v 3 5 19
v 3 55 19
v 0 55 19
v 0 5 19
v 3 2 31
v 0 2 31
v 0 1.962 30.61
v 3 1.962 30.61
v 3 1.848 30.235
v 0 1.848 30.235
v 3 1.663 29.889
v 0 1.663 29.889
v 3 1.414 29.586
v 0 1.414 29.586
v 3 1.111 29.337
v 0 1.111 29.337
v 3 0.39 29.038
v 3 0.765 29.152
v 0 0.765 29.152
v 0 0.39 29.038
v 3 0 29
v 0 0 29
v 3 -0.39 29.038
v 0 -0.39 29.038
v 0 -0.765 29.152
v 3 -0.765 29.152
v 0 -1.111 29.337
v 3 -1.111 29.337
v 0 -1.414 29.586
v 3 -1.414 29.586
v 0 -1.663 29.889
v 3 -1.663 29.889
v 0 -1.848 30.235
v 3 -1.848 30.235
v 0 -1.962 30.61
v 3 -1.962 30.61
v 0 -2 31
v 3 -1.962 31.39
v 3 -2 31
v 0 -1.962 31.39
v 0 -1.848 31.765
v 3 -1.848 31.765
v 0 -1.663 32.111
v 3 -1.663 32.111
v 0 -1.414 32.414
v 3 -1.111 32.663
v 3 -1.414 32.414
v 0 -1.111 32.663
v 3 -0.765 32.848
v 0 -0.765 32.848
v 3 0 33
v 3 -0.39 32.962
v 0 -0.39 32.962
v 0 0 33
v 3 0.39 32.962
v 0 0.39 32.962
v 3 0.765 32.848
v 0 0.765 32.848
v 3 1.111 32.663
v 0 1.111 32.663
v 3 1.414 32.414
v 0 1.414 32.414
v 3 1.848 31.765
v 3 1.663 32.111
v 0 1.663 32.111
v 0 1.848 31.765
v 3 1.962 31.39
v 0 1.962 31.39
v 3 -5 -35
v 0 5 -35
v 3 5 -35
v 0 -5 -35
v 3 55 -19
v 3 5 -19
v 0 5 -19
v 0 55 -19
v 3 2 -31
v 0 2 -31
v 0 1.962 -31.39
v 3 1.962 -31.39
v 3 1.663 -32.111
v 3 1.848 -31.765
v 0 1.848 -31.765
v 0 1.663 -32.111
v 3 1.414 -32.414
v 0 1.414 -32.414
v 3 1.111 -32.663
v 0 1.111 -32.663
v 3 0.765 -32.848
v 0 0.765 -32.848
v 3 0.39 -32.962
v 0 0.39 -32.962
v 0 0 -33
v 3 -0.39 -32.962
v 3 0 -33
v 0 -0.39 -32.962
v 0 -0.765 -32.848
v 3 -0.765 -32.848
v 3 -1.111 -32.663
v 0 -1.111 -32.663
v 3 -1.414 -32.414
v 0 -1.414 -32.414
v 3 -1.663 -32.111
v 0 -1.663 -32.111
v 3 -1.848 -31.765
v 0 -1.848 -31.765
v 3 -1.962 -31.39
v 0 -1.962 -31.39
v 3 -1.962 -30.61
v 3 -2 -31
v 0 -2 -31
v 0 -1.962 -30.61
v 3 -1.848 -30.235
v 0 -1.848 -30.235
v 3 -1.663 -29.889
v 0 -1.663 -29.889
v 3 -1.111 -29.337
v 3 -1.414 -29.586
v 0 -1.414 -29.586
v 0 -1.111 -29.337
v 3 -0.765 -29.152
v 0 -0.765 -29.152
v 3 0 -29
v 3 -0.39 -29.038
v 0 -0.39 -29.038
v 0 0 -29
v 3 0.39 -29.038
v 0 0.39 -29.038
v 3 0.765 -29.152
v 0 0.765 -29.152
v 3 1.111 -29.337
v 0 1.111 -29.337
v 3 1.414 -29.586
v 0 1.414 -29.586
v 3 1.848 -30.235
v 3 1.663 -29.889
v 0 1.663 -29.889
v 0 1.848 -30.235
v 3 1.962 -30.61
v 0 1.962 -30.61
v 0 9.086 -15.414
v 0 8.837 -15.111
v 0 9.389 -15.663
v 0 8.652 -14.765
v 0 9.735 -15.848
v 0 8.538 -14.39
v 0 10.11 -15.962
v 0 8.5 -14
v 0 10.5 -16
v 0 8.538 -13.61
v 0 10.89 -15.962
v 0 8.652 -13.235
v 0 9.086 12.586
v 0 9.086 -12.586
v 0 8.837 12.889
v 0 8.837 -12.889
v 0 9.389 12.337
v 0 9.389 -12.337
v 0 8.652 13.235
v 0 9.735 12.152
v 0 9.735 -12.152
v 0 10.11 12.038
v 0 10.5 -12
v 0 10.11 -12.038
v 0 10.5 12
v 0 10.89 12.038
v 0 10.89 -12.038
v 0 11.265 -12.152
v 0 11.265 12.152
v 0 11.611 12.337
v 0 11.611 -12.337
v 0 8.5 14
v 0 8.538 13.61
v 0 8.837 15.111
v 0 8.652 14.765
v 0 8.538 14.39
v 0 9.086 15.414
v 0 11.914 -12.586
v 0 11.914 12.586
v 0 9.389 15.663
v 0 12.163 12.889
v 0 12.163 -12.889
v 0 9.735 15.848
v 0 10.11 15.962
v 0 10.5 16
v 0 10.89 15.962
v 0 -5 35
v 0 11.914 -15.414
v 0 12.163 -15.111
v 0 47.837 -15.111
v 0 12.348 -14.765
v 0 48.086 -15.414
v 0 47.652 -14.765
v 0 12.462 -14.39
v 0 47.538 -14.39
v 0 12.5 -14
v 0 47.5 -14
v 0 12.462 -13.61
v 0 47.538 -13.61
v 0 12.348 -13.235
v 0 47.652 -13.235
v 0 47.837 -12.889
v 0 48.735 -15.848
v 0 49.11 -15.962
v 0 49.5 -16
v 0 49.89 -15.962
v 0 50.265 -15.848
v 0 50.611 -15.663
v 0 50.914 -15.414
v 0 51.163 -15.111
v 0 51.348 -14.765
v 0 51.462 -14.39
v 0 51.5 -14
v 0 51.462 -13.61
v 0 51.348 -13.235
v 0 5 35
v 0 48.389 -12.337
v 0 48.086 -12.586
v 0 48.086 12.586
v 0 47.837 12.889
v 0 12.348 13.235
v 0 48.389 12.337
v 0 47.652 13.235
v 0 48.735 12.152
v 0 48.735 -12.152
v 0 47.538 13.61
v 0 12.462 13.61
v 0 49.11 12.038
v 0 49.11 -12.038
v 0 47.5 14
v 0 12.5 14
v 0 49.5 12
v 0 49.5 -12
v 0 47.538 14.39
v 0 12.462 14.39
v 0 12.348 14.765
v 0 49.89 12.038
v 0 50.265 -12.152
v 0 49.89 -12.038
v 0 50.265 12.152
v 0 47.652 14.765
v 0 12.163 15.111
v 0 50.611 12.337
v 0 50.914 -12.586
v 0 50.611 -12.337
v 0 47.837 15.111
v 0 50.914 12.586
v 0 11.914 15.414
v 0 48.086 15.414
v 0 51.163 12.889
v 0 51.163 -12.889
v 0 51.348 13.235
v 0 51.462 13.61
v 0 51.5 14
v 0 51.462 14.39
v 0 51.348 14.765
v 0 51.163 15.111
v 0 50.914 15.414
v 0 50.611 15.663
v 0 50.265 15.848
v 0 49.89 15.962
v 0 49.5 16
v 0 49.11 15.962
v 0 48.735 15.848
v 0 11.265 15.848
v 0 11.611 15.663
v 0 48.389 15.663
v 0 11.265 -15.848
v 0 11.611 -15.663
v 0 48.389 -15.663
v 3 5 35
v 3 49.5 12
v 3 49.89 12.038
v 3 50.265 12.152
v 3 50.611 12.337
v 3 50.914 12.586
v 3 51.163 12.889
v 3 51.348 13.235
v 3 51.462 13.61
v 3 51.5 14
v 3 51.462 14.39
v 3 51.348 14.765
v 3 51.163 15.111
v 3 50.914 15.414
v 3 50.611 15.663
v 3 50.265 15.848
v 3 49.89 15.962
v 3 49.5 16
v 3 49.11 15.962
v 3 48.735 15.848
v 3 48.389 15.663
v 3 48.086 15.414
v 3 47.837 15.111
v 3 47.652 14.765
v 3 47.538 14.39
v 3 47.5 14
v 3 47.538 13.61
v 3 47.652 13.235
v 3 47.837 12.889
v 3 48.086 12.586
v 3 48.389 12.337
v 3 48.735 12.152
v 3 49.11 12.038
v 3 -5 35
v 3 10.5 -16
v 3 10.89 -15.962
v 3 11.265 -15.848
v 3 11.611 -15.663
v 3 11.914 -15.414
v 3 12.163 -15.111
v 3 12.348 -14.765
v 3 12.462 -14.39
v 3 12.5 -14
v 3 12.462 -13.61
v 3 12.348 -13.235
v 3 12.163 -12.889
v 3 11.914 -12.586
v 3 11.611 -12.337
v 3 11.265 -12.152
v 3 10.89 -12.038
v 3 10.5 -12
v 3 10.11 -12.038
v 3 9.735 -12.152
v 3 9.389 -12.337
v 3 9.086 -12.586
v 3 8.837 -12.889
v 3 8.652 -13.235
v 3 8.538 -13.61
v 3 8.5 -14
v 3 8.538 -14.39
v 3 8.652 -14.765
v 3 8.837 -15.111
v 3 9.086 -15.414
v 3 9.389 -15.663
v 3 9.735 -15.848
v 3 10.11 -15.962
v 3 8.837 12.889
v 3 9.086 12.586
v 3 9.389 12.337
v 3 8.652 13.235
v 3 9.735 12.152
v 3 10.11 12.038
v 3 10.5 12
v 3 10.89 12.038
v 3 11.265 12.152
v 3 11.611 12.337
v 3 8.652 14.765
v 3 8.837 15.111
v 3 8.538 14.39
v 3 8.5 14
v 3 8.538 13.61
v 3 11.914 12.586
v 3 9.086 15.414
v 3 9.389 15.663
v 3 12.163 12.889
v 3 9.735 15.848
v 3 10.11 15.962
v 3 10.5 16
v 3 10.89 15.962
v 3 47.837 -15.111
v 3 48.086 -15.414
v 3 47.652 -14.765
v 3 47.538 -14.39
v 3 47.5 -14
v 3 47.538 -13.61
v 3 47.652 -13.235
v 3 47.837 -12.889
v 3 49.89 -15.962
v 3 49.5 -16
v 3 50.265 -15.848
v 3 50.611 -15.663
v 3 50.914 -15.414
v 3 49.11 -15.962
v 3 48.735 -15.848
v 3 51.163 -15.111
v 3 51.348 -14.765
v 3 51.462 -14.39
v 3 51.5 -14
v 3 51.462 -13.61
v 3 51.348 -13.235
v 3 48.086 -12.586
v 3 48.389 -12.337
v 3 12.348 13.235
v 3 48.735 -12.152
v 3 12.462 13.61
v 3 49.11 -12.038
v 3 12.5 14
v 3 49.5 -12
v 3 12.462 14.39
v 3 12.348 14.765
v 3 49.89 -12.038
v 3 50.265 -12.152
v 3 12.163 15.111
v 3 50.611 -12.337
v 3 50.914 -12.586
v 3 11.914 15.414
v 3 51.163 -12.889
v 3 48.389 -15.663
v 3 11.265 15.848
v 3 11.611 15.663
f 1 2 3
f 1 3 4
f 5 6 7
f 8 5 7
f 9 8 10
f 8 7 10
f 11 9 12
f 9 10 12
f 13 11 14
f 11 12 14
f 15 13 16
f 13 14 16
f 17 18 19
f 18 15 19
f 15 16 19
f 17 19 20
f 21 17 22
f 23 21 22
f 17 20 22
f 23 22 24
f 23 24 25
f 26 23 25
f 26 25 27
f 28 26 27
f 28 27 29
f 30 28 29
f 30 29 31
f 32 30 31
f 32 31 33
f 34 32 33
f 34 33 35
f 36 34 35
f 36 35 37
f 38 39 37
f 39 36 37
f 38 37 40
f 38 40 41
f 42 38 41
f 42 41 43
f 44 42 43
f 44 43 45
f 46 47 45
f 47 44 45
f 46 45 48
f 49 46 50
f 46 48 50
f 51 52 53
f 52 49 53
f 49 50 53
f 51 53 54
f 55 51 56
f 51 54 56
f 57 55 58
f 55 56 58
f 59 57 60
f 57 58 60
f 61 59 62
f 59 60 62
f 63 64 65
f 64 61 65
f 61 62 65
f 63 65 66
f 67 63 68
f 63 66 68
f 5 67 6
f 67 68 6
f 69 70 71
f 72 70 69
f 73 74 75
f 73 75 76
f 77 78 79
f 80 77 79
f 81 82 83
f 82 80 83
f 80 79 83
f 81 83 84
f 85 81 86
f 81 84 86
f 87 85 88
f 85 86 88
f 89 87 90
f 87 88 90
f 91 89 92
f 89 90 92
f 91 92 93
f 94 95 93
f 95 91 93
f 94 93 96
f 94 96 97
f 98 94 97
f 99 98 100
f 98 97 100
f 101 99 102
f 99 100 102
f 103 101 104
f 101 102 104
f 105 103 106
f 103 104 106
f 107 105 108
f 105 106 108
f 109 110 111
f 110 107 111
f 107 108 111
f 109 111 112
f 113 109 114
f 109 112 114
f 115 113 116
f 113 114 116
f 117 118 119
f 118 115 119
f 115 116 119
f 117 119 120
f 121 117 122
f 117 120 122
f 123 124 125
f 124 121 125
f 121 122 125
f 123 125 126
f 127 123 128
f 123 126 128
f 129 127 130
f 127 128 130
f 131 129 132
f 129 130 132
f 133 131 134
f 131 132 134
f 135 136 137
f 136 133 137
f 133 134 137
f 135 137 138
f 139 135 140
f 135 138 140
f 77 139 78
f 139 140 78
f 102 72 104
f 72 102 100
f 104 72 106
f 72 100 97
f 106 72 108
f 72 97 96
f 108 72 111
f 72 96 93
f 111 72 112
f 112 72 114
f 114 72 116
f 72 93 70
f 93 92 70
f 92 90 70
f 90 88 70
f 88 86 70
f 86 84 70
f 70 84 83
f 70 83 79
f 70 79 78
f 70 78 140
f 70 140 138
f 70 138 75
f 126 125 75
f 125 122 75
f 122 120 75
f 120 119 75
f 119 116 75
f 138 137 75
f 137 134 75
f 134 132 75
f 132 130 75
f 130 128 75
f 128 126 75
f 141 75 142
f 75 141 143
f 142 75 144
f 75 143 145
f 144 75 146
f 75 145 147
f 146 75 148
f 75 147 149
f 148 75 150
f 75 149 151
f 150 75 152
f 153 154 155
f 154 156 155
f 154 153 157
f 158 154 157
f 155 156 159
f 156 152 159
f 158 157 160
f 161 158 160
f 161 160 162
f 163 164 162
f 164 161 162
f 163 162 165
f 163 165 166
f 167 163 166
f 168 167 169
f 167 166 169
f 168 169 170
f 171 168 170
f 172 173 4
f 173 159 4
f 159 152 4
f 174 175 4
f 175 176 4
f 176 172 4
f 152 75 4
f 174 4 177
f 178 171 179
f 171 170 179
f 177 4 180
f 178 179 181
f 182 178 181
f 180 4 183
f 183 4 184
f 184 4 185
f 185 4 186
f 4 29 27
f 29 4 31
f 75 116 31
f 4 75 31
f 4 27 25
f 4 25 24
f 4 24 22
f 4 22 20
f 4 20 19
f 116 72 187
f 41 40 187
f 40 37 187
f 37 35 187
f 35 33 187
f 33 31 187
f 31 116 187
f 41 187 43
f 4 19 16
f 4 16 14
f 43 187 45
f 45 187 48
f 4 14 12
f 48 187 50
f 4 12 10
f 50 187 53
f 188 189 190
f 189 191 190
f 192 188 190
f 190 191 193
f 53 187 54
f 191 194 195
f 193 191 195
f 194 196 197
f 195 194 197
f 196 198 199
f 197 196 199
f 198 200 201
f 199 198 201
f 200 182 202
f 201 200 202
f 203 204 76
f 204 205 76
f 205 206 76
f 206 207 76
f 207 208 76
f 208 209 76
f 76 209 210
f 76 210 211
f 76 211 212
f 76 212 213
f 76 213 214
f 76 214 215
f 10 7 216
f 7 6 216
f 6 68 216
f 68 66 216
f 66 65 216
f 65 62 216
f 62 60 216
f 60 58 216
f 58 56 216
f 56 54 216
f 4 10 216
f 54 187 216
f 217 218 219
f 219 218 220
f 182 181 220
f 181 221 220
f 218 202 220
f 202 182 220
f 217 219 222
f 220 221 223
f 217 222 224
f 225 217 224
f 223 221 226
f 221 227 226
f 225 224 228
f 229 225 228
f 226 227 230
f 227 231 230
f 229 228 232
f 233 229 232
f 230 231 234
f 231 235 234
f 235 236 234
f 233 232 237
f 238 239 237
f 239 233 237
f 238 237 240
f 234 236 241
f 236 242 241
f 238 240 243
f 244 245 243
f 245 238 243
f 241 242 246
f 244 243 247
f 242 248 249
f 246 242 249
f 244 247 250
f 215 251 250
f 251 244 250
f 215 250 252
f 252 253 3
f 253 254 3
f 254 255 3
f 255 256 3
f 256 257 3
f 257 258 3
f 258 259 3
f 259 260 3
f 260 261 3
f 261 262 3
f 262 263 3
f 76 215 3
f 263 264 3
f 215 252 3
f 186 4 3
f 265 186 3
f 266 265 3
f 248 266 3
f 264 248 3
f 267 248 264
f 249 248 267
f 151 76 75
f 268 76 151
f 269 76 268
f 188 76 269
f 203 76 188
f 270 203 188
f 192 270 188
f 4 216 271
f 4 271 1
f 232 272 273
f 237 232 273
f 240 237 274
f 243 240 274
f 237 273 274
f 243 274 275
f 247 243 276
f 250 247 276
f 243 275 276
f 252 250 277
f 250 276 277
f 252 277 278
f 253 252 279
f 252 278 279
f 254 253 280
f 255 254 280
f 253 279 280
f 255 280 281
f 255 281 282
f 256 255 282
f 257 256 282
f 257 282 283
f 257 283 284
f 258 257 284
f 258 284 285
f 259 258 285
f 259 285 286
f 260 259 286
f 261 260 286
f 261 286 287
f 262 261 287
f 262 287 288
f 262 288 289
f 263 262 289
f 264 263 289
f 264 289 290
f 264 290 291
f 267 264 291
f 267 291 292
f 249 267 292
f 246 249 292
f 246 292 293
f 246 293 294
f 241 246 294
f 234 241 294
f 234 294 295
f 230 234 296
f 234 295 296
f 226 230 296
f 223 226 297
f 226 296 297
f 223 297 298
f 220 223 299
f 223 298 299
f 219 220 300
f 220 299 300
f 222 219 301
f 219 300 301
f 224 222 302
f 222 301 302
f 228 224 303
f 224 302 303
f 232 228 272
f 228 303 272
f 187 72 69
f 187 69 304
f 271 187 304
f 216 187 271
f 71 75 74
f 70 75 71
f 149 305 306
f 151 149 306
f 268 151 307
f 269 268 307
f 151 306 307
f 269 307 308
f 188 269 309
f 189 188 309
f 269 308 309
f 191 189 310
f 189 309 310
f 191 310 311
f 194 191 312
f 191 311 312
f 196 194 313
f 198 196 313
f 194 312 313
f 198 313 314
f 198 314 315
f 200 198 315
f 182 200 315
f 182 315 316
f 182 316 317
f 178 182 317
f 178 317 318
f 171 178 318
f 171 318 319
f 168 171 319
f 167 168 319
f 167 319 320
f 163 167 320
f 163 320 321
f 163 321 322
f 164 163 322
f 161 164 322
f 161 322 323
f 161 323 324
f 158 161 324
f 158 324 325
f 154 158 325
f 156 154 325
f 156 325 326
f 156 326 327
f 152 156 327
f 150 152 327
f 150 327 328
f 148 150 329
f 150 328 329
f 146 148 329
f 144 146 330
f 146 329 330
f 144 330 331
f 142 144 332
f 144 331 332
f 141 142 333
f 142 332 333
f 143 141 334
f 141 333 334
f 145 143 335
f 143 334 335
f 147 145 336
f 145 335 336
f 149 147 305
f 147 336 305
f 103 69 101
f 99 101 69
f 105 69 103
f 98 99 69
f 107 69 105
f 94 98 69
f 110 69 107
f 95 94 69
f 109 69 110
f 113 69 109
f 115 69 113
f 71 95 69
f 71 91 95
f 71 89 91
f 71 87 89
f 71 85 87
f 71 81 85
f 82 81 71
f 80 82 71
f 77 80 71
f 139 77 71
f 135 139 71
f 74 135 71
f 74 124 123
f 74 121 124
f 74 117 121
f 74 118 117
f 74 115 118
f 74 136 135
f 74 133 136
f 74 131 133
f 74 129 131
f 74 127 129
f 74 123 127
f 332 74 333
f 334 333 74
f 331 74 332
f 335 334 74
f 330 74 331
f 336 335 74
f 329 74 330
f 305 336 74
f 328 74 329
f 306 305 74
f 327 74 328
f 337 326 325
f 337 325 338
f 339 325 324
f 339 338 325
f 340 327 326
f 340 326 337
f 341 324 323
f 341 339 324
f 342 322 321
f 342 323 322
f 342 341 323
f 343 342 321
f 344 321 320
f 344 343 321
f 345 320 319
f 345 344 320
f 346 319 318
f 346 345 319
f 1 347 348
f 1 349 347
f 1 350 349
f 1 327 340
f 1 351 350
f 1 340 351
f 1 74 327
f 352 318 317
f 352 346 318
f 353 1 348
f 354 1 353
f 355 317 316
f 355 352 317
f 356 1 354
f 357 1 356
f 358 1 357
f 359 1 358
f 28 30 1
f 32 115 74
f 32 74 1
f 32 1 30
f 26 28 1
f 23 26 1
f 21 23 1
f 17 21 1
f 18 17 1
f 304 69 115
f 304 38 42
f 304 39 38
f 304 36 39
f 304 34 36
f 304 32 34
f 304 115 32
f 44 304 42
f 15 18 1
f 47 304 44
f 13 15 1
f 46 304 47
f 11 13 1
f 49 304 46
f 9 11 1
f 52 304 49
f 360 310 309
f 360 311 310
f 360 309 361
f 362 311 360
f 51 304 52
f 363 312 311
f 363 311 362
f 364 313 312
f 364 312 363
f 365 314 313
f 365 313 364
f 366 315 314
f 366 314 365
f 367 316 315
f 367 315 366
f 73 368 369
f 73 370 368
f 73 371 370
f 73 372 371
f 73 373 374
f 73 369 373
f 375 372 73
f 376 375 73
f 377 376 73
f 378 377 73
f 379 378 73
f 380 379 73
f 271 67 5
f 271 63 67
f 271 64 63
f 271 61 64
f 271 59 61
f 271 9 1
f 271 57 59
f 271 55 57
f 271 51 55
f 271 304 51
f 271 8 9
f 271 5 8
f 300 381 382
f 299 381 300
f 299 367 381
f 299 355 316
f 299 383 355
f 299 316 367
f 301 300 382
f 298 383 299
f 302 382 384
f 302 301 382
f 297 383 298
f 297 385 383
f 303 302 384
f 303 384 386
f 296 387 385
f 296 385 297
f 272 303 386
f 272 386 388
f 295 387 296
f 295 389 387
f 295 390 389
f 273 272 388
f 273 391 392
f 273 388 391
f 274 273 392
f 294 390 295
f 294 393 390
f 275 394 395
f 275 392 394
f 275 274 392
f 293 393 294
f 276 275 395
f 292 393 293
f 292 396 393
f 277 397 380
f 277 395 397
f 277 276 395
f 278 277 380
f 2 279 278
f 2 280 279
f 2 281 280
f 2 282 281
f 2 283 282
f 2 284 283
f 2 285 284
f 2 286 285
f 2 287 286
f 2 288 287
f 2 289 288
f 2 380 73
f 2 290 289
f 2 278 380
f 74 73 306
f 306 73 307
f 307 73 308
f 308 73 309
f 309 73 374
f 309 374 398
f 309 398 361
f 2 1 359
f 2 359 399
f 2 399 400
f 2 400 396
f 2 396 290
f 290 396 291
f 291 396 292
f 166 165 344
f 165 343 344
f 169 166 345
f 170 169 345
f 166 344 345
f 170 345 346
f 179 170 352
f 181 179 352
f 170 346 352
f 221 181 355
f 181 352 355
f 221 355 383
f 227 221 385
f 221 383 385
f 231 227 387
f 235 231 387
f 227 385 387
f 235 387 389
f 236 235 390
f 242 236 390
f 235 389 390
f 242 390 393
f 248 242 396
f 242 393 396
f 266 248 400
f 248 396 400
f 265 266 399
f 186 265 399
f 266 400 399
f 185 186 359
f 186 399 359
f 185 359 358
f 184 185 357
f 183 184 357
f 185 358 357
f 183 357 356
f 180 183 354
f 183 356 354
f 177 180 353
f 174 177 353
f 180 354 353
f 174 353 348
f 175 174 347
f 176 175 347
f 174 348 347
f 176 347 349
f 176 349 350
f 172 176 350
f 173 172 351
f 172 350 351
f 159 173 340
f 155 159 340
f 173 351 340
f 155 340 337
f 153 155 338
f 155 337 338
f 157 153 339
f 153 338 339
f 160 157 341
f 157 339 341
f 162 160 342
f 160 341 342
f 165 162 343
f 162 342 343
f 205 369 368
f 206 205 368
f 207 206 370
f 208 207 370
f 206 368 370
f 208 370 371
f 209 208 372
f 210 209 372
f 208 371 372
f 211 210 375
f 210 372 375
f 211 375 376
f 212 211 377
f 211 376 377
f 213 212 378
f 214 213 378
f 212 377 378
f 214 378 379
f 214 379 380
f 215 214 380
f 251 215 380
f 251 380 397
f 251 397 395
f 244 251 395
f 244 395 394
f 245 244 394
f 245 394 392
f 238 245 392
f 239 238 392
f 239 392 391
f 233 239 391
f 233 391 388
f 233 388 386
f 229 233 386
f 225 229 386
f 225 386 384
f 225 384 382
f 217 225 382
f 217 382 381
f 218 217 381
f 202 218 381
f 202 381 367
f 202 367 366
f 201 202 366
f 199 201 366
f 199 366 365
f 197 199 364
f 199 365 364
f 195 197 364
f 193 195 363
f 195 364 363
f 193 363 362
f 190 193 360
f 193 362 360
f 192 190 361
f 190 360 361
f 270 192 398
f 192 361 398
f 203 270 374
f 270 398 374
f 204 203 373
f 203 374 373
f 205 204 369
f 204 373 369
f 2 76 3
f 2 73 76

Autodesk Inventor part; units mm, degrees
ref_plane "YZ Plane" through (0, 0, 0) normal (1, 0, 0) x (0, 1, 0)
ref_plane "XZ Plane" through (0, 0, 0) normal (0, 1, 0) x (-1, 0, 0)
ref_plane "XY Plane" through (0, 0, 0) normal (0, 0, 1) x (1, 0, 0)
sketch "Эскиз1" plane through (0, 0, 0) normal (1, 0, 0) x (0, 1, 0)
  line L0 (0, 0) -> (0, 31)
  line L1 (0, 0) -> (0, -31)
  circle A0 centre (0, 31) radius 2
  circle A1 centre (0, -31) radius 2
  line L2 (-5, 35) -> (5, 35)
  line L3 (5, 35) -> (5, -35)
  line L4 (5, -35) -> (-5, -35)
  line L5 (-5, -35) -> (-5, 35)
  line L6 (-5, 35) -> (5, -35) construction
  line L7 (5, 35) -> (-5, -35) construction
  dimension "d0" = 31
  dimension "d1" = 31
  dimension "d2" = 4
  dimension "d3" = 4
  dimension "d4" = 10
  dimension "d5" = 70
extrude "Выдавливание1" add sketch "Эскиз1" along normal blind 3
sketch "Эскиз2" plane through (3, 0, 0) normal (1, 0, 0) x (0, 0, -1)
  line L0 (35, 5) -> (-35, 5) projected
  line L1 (0, 5) -> (-14, 5)
  line L2 (-14, 5) -> (14, 5)
  line L3 (-14, 5) -> (-14, 10.5)
  line L4 (-14, 5) -> (-19, 5)
  line L5 (-19, 5) -> (19, 5)
  line L6 (19, 5) -> (19, 55)
  line L7 (19, 55) -> (-19, 55)
  line L8 (-19, 55) -> (-19, 5)
  circle A0 centre (-14, 10.5) radius 2
  line L9 (19, 30) -> (-19, 30)
  line L10 (0, 30) -> (0, 26.3042)
  circle A1 centre (14, 10.5) radius 2
  circle A2 centre (-14, 49.5) radius 2
  circle A3 centre (14, 49.5) radius 2
  point P0 (0, 0)
  dimension "d8" = 14
  dimension "d9" = 28
  dimension "d10" = 5.5
  dimension "d11" = 5
  dimension "d12" = 38
  dimension "d13" = 50
  dimension "d14" = 4
extrude "Выдавливание2" add sketch "Эскиз2" against normal blind 3
equation "\"d1\" = d0"
properties part number "КВ33.044.704 - Панель установки принимающей платы оси Y"
